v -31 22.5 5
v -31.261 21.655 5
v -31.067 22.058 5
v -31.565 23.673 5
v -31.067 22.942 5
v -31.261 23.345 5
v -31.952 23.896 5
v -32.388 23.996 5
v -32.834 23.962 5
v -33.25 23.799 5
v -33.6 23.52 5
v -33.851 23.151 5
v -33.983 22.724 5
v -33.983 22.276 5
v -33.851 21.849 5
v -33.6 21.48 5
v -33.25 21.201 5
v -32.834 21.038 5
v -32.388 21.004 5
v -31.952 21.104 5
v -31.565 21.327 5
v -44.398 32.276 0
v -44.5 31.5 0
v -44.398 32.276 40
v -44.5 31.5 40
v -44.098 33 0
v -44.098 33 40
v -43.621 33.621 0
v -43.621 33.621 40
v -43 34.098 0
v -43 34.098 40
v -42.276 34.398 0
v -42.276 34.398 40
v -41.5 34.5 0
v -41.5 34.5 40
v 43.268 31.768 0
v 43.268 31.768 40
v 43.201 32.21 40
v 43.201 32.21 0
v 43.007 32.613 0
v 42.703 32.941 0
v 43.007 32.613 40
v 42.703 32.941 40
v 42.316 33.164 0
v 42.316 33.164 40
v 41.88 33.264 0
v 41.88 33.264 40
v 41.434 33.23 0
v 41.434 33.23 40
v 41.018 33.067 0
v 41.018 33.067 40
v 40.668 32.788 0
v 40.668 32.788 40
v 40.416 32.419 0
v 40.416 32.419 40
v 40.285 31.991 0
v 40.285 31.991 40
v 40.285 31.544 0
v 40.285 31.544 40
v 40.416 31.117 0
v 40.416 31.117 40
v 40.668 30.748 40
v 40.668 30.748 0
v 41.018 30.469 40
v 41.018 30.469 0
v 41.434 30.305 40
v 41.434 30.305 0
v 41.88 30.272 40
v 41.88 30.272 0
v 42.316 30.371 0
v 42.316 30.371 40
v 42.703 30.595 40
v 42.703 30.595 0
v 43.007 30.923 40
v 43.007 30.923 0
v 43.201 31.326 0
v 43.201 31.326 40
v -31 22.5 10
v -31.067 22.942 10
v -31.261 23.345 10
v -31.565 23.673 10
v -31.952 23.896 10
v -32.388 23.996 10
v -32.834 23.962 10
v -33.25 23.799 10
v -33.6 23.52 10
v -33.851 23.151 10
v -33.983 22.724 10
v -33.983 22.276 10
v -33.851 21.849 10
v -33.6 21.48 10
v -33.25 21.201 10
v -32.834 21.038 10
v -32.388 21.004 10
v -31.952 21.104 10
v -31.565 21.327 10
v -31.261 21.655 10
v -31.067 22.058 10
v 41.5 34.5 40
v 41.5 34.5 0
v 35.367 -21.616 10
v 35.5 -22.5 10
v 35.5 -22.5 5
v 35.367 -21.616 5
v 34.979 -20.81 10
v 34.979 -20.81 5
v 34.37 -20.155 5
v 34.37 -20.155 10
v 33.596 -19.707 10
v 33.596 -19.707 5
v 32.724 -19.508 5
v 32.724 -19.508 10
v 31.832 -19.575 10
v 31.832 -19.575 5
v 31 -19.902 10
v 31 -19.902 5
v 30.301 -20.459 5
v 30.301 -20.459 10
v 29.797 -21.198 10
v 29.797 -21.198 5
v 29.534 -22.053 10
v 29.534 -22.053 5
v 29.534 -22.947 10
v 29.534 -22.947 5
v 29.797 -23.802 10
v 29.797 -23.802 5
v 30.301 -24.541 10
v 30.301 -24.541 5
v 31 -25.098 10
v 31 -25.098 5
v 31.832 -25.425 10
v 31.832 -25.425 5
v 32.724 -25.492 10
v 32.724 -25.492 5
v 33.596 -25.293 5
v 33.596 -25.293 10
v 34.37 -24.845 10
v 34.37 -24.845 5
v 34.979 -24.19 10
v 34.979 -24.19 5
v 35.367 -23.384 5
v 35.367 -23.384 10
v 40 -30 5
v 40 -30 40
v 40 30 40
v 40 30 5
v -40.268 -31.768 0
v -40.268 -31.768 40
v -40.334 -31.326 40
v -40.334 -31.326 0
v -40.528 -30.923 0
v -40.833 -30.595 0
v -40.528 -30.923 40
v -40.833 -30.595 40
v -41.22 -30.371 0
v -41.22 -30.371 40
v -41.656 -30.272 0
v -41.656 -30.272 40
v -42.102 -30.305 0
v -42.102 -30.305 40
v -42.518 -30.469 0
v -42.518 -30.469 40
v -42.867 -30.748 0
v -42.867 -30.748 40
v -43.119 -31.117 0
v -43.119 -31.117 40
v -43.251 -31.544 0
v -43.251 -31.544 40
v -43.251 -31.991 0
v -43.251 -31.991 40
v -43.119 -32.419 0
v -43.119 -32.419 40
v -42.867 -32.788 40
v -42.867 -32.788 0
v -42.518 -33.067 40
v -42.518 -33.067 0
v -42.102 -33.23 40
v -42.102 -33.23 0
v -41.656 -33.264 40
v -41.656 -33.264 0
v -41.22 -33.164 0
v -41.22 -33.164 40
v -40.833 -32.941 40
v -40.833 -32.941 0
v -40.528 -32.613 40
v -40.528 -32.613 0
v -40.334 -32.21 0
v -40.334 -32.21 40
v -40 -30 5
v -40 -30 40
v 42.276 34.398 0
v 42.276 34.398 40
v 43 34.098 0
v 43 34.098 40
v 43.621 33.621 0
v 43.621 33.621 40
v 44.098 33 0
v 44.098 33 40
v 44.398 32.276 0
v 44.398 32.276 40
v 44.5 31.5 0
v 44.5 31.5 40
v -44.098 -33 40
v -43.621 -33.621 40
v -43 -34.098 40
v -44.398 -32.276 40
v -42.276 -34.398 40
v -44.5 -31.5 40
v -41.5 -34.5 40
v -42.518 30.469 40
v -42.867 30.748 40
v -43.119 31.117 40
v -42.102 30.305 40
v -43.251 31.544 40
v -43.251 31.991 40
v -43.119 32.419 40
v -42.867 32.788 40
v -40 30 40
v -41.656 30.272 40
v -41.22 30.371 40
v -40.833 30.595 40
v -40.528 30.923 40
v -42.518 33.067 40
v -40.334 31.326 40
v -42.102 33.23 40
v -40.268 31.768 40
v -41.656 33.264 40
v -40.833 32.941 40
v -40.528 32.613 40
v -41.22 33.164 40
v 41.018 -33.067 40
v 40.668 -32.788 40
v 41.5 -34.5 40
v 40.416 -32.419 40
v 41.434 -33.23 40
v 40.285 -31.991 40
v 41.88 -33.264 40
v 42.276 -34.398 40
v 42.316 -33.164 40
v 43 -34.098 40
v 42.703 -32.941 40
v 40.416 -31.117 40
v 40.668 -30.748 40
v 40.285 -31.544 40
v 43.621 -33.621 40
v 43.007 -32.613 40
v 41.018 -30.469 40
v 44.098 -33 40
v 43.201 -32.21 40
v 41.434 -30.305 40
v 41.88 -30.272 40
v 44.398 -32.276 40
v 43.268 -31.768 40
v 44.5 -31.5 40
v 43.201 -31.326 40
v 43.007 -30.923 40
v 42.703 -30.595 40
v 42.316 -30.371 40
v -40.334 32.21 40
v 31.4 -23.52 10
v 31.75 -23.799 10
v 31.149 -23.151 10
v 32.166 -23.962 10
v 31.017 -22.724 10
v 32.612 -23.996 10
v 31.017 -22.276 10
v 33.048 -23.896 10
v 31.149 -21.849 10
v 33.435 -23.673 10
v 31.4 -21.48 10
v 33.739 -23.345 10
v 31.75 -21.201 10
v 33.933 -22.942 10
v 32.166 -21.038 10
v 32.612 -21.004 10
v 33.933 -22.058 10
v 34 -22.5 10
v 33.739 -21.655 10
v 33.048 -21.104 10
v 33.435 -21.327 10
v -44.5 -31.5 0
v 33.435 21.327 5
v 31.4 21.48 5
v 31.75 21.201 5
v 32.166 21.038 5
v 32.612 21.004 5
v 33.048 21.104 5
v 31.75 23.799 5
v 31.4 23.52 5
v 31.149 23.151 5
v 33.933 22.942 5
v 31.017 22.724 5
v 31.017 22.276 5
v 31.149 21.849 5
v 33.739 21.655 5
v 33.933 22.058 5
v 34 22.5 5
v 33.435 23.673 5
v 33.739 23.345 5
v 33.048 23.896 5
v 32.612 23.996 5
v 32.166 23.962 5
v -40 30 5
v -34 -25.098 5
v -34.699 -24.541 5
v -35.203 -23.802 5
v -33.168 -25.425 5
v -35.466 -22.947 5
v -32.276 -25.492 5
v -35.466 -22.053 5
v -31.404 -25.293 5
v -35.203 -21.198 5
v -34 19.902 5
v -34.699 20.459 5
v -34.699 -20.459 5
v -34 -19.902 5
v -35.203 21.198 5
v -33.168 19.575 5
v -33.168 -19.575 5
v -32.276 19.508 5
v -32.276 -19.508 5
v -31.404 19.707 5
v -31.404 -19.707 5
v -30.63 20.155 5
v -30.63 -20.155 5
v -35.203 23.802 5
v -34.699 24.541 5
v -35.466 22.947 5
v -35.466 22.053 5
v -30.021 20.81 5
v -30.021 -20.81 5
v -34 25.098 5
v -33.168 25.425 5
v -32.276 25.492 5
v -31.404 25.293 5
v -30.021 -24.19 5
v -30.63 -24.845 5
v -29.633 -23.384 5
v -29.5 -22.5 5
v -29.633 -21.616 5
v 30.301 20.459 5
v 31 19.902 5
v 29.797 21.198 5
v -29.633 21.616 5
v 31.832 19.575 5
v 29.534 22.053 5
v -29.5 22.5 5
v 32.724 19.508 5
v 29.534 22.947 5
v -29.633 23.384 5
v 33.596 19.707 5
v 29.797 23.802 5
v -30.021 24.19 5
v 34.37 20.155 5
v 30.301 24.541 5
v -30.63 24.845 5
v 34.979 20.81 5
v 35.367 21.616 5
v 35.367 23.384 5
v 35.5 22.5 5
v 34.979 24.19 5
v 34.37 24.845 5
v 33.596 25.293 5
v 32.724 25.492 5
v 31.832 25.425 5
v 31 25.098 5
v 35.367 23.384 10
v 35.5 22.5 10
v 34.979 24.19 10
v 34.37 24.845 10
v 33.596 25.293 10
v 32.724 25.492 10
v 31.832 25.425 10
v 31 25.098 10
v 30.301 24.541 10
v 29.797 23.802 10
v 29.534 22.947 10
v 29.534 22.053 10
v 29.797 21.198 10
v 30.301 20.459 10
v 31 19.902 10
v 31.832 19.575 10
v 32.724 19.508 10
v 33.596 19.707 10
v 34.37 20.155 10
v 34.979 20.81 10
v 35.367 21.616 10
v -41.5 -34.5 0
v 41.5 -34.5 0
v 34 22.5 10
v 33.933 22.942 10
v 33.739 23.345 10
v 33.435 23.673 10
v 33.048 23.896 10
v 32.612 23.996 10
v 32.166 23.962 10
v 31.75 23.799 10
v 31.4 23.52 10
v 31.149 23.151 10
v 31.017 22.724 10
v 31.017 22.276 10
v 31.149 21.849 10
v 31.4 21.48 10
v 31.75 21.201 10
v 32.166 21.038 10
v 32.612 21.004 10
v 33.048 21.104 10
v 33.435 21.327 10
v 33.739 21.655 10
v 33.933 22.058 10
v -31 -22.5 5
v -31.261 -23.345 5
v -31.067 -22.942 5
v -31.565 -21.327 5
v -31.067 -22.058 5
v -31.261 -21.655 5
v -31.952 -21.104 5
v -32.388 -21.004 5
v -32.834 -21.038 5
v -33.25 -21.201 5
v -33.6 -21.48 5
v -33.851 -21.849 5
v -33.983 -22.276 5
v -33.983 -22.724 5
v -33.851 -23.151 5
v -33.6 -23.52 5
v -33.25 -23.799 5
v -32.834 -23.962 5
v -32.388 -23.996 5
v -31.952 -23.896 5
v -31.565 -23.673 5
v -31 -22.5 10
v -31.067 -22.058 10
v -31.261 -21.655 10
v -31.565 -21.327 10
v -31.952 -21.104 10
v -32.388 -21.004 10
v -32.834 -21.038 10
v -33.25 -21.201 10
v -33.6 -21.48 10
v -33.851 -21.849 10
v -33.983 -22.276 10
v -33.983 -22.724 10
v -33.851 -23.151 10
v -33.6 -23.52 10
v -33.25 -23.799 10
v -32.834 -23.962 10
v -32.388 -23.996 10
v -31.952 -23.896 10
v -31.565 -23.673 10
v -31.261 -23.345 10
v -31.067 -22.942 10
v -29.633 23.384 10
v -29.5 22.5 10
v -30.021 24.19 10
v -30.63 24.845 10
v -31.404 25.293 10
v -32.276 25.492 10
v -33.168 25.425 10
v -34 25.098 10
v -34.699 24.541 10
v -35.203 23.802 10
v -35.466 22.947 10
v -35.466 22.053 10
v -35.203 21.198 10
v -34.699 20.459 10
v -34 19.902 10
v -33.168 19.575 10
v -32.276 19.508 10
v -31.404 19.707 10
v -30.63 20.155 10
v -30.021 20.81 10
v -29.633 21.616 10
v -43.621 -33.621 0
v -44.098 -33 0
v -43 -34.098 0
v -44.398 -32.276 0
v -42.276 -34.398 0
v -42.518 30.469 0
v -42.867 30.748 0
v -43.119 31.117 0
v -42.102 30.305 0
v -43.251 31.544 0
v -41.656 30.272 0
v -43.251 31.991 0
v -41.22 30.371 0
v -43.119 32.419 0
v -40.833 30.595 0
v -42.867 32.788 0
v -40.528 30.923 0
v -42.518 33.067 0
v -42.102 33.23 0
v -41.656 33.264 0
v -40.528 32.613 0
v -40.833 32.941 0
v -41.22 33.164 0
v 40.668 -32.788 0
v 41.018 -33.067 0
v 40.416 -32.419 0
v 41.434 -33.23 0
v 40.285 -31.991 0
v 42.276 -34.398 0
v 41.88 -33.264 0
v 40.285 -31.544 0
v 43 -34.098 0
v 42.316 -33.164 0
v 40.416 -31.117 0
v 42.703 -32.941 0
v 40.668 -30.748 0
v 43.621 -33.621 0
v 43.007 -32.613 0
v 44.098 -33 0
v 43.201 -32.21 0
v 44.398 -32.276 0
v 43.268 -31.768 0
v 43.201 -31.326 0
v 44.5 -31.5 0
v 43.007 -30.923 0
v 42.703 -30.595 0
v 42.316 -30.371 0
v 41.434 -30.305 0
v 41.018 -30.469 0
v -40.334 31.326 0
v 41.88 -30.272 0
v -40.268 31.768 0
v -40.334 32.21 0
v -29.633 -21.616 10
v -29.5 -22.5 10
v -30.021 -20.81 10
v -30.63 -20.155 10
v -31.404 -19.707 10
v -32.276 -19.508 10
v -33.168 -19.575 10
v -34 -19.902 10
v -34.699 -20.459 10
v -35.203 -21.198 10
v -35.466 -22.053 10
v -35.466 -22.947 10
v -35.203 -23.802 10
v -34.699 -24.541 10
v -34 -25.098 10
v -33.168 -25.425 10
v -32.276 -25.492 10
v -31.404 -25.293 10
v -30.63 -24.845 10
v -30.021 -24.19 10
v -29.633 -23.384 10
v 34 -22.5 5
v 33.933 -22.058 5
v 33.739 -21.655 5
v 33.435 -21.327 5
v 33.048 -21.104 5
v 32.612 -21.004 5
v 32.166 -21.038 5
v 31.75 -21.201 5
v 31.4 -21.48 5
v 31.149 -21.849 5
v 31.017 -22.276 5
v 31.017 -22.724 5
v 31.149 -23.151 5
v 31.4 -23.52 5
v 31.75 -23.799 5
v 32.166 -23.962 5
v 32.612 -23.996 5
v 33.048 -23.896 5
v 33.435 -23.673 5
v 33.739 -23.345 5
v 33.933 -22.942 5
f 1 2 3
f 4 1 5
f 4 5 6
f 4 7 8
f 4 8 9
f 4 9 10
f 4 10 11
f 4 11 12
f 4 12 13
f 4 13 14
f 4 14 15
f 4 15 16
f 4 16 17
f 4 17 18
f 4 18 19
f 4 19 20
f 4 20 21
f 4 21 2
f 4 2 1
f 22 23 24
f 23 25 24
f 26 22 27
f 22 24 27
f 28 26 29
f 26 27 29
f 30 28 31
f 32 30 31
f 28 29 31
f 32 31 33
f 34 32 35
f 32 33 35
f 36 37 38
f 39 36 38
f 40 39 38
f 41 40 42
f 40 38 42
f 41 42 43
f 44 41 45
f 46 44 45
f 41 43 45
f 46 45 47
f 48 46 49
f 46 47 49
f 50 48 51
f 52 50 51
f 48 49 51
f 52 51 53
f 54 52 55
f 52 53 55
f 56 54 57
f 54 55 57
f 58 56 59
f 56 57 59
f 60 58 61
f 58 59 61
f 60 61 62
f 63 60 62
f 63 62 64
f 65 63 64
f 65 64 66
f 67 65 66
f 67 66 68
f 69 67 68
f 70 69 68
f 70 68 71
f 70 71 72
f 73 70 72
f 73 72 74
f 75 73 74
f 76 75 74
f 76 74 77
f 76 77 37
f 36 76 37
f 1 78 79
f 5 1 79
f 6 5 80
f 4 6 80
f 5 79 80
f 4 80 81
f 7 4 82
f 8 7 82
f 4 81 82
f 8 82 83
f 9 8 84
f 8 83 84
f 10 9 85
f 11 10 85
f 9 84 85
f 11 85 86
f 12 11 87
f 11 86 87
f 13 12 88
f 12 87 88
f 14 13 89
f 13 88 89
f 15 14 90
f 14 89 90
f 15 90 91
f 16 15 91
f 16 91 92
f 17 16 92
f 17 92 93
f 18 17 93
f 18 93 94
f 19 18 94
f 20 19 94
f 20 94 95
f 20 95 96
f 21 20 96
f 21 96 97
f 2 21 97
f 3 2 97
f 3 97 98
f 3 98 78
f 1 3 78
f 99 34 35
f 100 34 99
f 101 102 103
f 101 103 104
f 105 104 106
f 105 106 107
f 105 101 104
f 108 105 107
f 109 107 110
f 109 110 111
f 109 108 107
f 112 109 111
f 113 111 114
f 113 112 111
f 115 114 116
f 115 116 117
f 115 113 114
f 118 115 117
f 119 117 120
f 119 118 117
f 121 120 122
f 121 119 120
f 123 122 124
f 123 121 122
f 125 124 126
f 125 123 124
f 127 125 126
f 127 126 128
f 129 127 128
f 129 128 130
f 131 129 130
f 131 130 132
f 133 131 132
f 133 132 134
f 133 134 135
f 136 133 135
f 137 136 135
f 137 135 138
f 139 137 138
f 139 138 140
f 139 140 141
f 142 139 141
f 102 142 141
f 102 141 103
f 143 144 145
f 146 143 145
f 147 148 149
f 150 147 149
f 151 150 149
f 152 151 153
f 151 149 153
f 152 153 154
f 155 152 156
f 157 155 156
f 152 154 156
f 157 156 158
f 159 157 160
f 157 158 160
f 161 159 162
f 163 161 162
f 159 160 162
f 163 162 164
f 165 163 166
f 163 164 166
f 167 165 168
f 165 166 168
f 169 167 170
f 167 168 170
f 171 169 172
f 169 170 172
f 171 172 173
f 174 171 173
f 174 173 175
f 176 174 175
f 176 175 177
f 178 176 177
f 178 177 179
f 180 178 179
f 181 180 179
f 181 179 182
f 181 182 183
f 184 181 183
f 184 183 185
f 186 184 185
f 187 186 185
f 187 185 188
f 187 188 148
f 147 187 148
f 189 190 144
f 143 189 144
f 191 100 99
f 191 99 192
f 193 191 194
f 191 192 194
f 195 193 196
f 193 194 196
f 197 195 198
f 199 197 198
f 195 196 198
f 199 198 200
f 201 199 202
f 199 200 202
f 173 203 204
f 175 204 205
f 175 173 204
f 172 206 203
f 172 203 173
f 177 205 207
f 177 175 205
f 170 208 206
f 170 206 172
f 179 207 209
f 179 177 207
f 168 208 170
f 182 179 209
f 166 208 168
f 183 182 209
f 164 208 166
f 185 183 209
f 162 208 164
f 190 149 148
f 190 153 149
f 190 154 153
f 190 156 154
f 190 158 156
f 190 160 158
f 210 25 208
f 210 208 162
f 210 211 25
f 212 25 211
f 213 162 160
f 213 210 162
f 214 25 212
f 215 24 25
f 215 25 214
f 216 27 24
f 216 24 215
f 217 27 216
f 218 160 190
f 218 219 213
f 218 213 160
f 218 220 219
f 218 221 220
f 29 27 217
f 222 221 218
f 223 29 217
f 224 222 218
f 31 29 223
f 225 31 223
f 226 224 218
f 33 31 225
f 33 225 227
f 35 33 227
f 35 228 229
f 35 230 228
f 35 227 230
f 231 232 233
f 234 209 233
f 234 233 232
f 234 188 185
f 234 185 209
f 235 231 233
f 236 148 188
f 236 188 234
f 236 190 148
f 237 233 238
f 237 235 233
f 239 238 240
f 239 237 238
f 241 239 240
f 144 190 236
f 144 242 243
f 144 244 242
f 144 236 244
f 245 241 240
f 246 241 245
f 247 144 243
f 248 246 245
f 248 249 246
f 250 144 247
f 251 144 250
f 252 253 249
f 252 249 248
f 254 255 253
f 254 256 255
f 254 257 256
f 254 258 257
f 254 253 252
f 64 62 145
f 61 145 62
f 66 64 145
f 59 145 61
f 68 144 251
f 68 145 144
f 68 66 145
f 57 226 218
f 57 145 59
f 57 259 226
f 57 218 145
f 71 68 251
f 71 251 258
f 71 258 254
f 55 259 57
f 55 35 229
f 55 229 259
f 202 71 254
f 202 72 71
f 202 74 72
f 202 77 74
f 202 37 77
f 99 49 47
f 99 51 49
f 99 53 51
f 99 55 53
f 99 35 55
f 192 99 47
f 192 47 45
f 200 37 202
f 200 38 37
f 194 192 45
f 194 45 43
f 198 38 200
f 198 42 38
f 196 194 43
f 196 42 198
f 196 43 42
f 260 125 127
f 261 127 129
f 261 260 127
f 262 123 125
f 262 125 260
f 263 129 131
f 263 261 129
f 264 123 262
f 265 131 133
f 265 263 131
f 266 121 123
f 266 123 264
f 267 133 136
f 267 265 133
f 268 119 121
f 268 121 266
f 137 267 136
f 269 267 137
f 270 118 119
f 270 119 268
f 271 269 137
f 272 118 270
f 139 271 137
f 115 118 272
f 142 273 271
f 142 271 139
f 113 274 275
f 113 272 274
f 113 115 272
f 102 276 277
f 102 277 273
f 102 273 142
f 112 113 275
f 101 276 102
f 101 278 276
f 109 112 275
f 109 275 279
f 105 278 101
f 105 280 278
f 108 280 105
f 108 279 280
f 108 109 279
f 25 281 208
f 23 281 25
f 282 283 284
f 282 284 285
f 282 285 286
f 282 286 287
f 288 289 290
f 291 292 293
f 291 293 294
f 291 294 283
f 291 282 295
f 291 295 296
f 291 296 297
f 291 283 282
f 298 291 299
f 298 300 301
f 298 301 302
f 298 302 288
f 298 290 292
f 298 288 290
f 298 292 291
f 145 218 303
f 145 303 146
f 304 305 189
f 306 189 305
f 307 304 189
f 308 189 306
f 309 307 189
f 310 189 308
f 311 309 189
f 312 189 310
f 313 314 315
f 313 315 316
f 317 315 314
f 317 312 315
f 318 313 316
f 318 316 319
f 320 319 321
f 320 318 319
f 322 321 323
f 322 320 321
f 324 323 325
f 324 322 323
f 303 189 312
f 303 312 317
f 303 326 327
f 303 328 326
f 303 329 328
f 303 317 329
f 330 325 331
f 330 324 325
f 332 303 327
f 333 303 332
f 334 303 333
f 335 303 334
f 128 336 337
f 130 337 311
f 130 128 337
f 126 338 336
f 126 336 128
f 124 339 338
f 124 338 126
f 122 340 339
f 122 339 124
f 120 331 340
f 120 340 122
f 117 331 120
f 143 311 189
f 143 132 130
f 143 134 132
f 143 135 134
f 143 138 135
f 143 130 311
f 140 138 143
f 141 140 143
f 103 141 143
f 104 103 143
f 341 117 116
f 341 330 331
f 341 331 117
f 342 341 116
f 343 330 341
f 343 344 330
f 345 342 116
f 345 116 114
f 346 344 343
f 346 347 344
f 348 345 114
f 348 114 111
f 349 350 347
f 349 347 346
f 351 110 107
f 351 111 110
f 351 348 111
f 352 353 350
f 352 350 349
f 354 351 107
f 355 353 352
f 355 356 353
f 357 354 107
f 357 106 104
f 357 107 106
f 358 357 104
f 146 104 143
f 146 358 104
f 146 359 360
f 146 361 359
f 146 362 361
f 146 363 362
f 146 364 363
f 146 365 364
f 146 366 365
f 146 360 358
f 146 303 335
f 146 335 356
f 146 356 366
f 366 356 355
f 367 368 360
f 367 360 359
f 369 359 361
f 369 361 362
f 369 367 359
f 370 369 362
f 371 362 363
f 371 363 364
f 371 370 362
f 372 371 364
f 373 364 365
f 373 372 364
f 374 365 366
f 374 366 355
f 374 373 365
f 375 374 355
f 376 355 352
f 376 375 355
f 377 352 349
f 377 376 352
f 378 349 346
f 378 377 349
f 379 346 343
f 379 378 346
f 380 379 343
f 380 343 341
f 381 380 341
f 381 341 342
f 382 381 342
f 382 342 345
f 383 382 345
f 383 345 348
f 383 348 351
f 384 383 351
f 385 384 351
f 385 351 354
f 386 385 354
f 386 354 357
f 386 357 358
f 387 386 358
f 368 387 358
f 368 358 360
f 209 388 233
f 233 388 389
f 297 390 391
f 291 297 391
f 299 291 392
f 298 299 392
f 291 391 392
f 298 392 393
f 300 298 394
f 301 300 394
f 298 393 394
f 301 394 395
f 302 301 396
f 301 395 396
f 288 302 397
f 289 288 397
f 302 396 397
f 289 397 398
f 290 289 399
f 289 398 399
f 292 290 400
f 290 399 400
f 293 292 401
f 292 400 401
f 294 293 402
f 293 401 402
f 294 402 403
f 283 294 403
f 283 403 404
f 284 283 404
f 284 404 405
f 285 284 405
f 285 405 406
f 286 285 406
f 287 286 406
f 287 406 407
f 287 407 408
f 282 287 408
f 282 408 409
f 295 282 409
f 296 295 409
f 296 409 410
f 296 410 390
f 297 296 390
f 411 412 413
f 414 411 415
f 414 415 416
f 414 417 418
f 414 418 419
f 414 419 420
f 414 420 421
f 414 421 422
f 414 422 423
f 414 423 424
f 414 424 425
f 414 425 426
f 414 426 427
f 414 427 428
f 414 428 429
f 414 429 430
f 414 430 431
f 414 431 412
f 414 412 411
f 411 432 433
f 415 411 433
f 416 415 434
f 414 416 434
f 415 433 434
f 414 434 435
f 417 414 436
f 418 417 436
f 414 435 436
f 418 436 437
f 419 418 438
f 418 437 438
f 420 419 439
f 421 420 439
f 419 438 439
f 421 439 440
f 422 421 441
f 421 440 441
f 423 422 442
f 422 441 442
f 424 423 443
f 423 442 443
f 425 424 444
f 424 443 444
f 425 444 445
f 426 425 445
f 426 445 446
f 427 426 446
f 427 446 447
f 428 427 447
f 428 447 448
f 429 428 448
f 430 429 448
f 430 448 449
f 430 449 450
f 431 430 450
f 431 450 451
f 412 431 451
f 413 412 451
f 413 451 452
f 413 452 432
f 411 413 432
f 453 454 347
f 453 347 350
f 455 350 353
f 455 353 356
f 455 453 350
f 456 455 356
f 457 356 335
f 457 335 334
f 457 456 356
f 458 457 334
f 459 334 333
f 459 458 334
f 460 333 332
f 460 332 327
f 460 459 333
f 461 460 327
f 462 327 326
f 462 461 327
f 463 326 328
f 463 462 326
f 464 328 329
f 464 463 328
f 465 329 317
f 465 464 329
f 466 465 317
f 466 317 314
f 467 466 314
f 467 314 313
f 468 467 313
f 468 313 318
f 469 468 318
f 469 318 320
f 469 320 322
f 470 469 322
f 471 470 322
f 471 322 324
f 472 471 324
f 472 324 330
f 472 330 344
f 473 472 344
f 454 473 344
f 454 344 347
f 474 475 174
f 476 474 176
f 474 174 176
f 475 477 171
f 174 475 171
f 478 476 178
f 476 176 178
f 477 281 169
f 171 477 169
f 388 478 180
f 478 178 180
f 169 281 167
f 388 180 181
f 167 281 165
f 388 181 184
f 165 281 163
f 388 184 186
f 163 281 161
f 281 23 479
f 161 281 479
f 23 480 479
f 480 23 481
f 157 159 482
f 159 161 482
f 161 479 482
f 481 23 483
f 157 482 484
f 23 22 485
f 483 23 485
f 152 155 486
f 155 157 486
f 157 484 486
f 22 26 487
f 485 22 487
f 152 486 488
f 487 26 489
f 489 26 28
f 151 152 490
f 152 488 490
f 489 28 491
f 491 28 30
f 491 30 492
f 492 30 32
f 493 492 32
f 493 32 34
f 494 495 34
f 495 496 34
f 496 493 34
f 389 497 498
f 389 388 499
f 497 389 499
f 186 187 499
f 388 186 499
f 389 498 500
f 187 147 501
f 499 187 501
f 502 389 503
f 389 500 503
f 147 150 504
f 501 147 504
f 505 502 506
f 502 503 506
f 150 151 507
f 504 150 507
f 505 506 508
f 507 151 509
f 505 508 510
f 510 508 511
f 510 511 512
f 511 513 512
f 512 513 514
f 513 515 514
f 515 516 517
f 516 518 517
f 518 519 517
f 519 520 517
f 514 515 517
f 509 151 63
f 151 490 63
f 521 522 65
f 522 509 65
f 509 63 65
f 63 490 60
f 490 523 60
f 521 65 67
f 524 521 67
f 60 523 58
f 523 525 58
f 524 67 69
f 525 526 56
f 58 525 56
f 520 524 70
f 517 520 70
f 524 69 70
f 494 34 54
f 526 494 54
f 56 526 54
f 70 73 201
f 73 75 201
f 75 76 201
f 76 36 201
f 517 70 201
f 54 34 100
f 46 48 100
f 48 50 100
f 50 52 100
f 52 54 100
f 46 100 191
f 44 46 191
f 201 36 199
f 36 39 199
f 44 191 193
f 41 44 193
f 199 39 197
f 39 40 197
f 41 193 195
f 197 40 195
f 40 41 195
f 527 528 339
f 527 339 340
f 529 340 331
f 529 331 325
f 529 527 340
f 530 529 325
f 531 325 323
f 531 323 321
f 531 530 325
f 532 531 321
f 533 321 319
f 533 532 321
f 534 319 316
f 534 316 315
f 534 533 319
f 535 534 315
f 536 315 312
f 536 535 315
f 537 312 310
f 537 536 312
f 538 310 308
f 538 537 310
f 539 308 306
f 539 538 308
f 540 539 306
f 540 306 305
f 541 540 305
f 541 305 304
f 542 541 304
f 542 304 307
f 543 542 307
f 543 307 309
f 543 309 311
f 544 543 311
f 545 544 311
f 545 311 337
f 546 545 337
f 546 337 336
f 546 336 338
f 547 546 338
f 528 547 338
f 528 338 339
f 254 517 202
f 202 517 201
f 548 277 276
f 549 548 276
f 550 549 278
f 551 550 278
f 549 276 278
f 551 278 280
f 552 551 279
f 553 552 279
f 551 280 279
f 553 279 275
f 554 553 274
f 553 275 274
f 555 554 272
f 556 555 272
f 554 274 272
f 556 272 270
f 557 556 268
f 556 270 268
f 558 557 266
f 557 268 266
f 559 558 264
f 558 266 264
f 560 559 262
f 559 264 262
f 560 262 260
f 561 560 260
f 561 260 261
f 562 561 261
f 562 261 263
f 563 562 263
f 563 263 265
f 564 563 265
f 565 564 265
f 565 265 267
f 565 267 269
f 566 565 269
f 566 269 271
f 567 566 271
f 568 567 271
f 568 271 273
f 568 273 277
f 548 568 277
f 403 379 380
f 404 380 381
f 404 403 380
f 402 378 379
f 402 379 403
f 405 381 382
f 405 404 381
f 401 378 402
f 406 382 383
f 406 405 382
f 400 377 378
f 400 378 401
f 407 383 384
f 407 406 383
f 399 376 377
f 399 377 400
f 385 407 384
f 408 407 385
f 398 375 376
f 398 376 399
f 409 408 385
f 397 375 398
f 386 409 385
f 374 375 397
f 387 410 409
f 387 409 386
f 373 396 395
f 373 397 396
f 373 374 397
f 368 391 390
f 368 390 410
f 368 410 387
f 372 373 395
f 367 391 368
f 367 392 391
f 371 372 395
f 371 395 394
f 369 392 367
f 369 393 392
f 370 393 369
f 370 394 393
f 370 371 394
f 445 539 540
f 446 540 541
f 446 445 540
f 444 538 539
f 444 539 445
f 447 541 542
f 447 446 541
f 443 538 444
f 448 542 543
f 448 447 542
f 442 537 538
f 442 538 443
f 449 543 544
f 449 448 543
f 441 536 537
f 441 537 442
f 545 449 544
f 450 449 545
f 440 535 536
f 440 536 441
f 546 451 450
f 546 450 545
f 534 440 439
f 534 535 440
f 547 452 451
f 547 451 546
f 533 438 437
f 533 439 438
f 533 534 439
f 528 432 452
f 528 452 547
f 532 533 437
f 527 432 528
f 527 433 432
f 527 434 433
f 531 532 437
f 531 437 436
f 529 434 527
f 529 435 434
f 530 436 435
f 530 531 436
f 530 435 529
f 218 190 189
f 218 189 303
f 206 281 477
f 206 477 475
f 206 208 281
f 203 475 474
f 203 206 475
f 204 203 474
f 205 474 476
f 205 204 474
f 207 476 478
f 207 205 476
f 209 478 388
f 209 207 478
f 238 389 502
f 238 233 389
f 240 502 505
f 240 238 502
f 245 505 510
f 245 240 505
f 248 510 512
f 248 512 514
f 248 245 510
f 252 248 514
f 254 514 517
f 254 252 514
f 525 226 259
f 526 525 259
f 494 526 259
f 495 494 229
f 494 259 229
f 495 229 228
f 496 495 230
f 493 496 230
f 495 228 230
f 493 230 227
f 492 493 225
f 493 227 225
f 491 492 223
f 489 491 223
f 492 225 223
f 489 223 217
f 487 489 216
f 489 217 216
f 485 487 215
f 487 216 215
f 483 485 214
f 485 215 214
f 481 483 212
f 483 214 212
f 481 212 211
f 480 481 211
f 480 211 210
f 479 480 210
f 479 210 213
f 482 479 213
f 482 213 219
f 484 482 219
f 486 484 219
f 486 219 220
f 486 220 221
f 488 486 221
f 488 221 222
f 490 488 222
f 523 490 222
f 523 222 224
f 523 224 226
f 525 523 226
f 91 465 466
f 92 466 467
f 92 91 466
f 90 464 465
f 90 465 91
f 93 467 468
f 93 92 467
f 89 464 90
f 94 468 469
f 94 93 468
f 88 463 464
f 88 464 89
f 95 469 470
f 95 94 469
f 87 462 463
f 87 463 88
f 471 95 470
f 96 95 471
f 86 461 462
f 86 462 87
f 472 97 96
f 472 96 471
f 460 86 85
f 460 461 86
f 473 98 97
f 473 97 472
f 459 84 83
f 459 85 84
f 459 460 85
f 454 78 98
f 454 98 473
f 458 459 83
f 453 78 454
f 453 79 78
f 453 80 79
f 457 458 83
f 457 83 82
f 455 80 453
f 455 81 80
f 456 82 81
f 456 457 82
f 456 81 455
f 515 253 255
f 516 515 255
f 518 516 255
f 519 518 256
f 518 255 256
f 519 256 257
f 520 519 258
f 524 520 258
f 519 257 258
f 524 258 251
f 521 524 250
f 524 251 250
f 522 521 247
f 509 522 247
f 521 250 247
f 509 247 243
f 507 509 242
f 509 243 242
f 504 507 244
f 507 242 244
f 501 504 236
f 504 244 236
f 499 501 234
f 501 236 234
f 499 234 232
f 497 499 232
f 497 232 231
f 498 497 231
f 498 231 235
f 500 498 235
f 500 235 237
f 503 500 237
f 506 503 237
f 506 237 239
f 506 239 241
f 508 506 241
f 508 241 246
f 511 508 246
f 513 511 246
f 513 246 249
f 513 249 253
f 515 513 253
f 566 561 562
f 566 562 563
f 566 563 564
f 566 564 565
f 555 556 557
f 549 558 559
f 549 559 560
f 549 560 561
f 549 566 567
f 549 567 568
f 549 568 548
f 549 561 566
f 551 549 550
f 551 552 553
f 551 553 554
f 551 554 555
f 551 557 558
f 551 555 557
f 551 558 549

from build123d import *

# Parameters (mm, degrees)
SKETCH_W        = 89
SKETCH_H        = 69
PAD_DEPTH       = 40
SKETCH001_W     = 80
SKETCH001_H     = 60
SKETCH001_R     = 3
SKETCH001_R_2   = 1.5
POCKET_DEPTH    = 35
SKETCH002_R     = 1.5
POCKET001_DEPTH = 40.001
SKETCH003_W     = 76.892074
SKETCH003_H     = 56.42009
POCKET002_DEPTH = 30
FILLET_R        = 3


with BuildPart() as part:
    # Sketch → Pad (new body)
    with BuildSketch(Plane.XY):
        Rectangle(SKETCH_W, SKETCH_H)
    extrude(amount=PAD_DEPTH)

    # Sketch001 (on DatumPlane) → Pocket (cut)
    with BuildSketch(Plane.XY.offset(40)):
        Rectangle(SKETCH001_W, SKETCH001_H)
        with Locations((-32.5, 22.5)):
            Circle(SKETCH001_R, mode=Mode.SUBTRACT)
        with Locations((32.5, 22.5)):
            Circle(SKETCH001_R, mode=Mode.SUBTRACT)
        with Locations((32.5, -22.5)):
            Circle(SKETCH001_R, mode=Mode.SUBTRACT)
        with Locations((-32.5, -22.5)):
            Circle(SKETCH001_R, mode=Mode.SUBTRACT)
        with Locations((-32.5, 22.5)):
            Circle(SKETCH001_R_2)
        with Locations((32.5, 22.5)):
            Circle(SKETCH001_R_2)
        with Locations((32.5, -22.5)):
            Circle(SKETCH001_R_2)
        with Locations((-32.5, -22.5)):
            Circle(SKETCH001_R_2)
    extrude(amount=-POCKET_DEPTH, mode=Mode.SUBTRACT)

    # Sketch002 (on DatumPlane) → Pocket001 (cut, through all)
    with BuildSketch(Plane.XY.offset(40)):
        with Locations((41.767767, 31.767767)):
            Circle(SKETCH002_R)
        with Locations((41.767767, -31.767767)):
            Circle(SKETCH002_R)
        with Locations((-41.767767, -31.767767)):
            Circle(SKETCH002_R)
        with Locations((-41.767767, 31.767767)):
            Circle(SKETCH002_R)
    extrude(amount=-POCKET001_DEPTH, mode=Mode.SUBTRACT)

    # Sketch003 (on DatumPlane) → Pocket002 (cut)
    with BuildSketch(Plane.XY.offset(40)):
        Rectangle(SKETCH003_W, SKETCH003_H)
    extrude(amount=-POCKET002_DEPTH, mode=Mode.SUBTRACT)

    # Fillet
    fillet_edges = [part.edges().sort_by_distance(p)[0] for p in [
        (-44.5, -34.5, 20),
        (44.5, -34.5, 20),
        (44.5, 34.5, 20),
        (-44.5, 34.5, 20),
    ]]
    fillet(fillet_edges, radius=FILLET_R)


solid = part.part
